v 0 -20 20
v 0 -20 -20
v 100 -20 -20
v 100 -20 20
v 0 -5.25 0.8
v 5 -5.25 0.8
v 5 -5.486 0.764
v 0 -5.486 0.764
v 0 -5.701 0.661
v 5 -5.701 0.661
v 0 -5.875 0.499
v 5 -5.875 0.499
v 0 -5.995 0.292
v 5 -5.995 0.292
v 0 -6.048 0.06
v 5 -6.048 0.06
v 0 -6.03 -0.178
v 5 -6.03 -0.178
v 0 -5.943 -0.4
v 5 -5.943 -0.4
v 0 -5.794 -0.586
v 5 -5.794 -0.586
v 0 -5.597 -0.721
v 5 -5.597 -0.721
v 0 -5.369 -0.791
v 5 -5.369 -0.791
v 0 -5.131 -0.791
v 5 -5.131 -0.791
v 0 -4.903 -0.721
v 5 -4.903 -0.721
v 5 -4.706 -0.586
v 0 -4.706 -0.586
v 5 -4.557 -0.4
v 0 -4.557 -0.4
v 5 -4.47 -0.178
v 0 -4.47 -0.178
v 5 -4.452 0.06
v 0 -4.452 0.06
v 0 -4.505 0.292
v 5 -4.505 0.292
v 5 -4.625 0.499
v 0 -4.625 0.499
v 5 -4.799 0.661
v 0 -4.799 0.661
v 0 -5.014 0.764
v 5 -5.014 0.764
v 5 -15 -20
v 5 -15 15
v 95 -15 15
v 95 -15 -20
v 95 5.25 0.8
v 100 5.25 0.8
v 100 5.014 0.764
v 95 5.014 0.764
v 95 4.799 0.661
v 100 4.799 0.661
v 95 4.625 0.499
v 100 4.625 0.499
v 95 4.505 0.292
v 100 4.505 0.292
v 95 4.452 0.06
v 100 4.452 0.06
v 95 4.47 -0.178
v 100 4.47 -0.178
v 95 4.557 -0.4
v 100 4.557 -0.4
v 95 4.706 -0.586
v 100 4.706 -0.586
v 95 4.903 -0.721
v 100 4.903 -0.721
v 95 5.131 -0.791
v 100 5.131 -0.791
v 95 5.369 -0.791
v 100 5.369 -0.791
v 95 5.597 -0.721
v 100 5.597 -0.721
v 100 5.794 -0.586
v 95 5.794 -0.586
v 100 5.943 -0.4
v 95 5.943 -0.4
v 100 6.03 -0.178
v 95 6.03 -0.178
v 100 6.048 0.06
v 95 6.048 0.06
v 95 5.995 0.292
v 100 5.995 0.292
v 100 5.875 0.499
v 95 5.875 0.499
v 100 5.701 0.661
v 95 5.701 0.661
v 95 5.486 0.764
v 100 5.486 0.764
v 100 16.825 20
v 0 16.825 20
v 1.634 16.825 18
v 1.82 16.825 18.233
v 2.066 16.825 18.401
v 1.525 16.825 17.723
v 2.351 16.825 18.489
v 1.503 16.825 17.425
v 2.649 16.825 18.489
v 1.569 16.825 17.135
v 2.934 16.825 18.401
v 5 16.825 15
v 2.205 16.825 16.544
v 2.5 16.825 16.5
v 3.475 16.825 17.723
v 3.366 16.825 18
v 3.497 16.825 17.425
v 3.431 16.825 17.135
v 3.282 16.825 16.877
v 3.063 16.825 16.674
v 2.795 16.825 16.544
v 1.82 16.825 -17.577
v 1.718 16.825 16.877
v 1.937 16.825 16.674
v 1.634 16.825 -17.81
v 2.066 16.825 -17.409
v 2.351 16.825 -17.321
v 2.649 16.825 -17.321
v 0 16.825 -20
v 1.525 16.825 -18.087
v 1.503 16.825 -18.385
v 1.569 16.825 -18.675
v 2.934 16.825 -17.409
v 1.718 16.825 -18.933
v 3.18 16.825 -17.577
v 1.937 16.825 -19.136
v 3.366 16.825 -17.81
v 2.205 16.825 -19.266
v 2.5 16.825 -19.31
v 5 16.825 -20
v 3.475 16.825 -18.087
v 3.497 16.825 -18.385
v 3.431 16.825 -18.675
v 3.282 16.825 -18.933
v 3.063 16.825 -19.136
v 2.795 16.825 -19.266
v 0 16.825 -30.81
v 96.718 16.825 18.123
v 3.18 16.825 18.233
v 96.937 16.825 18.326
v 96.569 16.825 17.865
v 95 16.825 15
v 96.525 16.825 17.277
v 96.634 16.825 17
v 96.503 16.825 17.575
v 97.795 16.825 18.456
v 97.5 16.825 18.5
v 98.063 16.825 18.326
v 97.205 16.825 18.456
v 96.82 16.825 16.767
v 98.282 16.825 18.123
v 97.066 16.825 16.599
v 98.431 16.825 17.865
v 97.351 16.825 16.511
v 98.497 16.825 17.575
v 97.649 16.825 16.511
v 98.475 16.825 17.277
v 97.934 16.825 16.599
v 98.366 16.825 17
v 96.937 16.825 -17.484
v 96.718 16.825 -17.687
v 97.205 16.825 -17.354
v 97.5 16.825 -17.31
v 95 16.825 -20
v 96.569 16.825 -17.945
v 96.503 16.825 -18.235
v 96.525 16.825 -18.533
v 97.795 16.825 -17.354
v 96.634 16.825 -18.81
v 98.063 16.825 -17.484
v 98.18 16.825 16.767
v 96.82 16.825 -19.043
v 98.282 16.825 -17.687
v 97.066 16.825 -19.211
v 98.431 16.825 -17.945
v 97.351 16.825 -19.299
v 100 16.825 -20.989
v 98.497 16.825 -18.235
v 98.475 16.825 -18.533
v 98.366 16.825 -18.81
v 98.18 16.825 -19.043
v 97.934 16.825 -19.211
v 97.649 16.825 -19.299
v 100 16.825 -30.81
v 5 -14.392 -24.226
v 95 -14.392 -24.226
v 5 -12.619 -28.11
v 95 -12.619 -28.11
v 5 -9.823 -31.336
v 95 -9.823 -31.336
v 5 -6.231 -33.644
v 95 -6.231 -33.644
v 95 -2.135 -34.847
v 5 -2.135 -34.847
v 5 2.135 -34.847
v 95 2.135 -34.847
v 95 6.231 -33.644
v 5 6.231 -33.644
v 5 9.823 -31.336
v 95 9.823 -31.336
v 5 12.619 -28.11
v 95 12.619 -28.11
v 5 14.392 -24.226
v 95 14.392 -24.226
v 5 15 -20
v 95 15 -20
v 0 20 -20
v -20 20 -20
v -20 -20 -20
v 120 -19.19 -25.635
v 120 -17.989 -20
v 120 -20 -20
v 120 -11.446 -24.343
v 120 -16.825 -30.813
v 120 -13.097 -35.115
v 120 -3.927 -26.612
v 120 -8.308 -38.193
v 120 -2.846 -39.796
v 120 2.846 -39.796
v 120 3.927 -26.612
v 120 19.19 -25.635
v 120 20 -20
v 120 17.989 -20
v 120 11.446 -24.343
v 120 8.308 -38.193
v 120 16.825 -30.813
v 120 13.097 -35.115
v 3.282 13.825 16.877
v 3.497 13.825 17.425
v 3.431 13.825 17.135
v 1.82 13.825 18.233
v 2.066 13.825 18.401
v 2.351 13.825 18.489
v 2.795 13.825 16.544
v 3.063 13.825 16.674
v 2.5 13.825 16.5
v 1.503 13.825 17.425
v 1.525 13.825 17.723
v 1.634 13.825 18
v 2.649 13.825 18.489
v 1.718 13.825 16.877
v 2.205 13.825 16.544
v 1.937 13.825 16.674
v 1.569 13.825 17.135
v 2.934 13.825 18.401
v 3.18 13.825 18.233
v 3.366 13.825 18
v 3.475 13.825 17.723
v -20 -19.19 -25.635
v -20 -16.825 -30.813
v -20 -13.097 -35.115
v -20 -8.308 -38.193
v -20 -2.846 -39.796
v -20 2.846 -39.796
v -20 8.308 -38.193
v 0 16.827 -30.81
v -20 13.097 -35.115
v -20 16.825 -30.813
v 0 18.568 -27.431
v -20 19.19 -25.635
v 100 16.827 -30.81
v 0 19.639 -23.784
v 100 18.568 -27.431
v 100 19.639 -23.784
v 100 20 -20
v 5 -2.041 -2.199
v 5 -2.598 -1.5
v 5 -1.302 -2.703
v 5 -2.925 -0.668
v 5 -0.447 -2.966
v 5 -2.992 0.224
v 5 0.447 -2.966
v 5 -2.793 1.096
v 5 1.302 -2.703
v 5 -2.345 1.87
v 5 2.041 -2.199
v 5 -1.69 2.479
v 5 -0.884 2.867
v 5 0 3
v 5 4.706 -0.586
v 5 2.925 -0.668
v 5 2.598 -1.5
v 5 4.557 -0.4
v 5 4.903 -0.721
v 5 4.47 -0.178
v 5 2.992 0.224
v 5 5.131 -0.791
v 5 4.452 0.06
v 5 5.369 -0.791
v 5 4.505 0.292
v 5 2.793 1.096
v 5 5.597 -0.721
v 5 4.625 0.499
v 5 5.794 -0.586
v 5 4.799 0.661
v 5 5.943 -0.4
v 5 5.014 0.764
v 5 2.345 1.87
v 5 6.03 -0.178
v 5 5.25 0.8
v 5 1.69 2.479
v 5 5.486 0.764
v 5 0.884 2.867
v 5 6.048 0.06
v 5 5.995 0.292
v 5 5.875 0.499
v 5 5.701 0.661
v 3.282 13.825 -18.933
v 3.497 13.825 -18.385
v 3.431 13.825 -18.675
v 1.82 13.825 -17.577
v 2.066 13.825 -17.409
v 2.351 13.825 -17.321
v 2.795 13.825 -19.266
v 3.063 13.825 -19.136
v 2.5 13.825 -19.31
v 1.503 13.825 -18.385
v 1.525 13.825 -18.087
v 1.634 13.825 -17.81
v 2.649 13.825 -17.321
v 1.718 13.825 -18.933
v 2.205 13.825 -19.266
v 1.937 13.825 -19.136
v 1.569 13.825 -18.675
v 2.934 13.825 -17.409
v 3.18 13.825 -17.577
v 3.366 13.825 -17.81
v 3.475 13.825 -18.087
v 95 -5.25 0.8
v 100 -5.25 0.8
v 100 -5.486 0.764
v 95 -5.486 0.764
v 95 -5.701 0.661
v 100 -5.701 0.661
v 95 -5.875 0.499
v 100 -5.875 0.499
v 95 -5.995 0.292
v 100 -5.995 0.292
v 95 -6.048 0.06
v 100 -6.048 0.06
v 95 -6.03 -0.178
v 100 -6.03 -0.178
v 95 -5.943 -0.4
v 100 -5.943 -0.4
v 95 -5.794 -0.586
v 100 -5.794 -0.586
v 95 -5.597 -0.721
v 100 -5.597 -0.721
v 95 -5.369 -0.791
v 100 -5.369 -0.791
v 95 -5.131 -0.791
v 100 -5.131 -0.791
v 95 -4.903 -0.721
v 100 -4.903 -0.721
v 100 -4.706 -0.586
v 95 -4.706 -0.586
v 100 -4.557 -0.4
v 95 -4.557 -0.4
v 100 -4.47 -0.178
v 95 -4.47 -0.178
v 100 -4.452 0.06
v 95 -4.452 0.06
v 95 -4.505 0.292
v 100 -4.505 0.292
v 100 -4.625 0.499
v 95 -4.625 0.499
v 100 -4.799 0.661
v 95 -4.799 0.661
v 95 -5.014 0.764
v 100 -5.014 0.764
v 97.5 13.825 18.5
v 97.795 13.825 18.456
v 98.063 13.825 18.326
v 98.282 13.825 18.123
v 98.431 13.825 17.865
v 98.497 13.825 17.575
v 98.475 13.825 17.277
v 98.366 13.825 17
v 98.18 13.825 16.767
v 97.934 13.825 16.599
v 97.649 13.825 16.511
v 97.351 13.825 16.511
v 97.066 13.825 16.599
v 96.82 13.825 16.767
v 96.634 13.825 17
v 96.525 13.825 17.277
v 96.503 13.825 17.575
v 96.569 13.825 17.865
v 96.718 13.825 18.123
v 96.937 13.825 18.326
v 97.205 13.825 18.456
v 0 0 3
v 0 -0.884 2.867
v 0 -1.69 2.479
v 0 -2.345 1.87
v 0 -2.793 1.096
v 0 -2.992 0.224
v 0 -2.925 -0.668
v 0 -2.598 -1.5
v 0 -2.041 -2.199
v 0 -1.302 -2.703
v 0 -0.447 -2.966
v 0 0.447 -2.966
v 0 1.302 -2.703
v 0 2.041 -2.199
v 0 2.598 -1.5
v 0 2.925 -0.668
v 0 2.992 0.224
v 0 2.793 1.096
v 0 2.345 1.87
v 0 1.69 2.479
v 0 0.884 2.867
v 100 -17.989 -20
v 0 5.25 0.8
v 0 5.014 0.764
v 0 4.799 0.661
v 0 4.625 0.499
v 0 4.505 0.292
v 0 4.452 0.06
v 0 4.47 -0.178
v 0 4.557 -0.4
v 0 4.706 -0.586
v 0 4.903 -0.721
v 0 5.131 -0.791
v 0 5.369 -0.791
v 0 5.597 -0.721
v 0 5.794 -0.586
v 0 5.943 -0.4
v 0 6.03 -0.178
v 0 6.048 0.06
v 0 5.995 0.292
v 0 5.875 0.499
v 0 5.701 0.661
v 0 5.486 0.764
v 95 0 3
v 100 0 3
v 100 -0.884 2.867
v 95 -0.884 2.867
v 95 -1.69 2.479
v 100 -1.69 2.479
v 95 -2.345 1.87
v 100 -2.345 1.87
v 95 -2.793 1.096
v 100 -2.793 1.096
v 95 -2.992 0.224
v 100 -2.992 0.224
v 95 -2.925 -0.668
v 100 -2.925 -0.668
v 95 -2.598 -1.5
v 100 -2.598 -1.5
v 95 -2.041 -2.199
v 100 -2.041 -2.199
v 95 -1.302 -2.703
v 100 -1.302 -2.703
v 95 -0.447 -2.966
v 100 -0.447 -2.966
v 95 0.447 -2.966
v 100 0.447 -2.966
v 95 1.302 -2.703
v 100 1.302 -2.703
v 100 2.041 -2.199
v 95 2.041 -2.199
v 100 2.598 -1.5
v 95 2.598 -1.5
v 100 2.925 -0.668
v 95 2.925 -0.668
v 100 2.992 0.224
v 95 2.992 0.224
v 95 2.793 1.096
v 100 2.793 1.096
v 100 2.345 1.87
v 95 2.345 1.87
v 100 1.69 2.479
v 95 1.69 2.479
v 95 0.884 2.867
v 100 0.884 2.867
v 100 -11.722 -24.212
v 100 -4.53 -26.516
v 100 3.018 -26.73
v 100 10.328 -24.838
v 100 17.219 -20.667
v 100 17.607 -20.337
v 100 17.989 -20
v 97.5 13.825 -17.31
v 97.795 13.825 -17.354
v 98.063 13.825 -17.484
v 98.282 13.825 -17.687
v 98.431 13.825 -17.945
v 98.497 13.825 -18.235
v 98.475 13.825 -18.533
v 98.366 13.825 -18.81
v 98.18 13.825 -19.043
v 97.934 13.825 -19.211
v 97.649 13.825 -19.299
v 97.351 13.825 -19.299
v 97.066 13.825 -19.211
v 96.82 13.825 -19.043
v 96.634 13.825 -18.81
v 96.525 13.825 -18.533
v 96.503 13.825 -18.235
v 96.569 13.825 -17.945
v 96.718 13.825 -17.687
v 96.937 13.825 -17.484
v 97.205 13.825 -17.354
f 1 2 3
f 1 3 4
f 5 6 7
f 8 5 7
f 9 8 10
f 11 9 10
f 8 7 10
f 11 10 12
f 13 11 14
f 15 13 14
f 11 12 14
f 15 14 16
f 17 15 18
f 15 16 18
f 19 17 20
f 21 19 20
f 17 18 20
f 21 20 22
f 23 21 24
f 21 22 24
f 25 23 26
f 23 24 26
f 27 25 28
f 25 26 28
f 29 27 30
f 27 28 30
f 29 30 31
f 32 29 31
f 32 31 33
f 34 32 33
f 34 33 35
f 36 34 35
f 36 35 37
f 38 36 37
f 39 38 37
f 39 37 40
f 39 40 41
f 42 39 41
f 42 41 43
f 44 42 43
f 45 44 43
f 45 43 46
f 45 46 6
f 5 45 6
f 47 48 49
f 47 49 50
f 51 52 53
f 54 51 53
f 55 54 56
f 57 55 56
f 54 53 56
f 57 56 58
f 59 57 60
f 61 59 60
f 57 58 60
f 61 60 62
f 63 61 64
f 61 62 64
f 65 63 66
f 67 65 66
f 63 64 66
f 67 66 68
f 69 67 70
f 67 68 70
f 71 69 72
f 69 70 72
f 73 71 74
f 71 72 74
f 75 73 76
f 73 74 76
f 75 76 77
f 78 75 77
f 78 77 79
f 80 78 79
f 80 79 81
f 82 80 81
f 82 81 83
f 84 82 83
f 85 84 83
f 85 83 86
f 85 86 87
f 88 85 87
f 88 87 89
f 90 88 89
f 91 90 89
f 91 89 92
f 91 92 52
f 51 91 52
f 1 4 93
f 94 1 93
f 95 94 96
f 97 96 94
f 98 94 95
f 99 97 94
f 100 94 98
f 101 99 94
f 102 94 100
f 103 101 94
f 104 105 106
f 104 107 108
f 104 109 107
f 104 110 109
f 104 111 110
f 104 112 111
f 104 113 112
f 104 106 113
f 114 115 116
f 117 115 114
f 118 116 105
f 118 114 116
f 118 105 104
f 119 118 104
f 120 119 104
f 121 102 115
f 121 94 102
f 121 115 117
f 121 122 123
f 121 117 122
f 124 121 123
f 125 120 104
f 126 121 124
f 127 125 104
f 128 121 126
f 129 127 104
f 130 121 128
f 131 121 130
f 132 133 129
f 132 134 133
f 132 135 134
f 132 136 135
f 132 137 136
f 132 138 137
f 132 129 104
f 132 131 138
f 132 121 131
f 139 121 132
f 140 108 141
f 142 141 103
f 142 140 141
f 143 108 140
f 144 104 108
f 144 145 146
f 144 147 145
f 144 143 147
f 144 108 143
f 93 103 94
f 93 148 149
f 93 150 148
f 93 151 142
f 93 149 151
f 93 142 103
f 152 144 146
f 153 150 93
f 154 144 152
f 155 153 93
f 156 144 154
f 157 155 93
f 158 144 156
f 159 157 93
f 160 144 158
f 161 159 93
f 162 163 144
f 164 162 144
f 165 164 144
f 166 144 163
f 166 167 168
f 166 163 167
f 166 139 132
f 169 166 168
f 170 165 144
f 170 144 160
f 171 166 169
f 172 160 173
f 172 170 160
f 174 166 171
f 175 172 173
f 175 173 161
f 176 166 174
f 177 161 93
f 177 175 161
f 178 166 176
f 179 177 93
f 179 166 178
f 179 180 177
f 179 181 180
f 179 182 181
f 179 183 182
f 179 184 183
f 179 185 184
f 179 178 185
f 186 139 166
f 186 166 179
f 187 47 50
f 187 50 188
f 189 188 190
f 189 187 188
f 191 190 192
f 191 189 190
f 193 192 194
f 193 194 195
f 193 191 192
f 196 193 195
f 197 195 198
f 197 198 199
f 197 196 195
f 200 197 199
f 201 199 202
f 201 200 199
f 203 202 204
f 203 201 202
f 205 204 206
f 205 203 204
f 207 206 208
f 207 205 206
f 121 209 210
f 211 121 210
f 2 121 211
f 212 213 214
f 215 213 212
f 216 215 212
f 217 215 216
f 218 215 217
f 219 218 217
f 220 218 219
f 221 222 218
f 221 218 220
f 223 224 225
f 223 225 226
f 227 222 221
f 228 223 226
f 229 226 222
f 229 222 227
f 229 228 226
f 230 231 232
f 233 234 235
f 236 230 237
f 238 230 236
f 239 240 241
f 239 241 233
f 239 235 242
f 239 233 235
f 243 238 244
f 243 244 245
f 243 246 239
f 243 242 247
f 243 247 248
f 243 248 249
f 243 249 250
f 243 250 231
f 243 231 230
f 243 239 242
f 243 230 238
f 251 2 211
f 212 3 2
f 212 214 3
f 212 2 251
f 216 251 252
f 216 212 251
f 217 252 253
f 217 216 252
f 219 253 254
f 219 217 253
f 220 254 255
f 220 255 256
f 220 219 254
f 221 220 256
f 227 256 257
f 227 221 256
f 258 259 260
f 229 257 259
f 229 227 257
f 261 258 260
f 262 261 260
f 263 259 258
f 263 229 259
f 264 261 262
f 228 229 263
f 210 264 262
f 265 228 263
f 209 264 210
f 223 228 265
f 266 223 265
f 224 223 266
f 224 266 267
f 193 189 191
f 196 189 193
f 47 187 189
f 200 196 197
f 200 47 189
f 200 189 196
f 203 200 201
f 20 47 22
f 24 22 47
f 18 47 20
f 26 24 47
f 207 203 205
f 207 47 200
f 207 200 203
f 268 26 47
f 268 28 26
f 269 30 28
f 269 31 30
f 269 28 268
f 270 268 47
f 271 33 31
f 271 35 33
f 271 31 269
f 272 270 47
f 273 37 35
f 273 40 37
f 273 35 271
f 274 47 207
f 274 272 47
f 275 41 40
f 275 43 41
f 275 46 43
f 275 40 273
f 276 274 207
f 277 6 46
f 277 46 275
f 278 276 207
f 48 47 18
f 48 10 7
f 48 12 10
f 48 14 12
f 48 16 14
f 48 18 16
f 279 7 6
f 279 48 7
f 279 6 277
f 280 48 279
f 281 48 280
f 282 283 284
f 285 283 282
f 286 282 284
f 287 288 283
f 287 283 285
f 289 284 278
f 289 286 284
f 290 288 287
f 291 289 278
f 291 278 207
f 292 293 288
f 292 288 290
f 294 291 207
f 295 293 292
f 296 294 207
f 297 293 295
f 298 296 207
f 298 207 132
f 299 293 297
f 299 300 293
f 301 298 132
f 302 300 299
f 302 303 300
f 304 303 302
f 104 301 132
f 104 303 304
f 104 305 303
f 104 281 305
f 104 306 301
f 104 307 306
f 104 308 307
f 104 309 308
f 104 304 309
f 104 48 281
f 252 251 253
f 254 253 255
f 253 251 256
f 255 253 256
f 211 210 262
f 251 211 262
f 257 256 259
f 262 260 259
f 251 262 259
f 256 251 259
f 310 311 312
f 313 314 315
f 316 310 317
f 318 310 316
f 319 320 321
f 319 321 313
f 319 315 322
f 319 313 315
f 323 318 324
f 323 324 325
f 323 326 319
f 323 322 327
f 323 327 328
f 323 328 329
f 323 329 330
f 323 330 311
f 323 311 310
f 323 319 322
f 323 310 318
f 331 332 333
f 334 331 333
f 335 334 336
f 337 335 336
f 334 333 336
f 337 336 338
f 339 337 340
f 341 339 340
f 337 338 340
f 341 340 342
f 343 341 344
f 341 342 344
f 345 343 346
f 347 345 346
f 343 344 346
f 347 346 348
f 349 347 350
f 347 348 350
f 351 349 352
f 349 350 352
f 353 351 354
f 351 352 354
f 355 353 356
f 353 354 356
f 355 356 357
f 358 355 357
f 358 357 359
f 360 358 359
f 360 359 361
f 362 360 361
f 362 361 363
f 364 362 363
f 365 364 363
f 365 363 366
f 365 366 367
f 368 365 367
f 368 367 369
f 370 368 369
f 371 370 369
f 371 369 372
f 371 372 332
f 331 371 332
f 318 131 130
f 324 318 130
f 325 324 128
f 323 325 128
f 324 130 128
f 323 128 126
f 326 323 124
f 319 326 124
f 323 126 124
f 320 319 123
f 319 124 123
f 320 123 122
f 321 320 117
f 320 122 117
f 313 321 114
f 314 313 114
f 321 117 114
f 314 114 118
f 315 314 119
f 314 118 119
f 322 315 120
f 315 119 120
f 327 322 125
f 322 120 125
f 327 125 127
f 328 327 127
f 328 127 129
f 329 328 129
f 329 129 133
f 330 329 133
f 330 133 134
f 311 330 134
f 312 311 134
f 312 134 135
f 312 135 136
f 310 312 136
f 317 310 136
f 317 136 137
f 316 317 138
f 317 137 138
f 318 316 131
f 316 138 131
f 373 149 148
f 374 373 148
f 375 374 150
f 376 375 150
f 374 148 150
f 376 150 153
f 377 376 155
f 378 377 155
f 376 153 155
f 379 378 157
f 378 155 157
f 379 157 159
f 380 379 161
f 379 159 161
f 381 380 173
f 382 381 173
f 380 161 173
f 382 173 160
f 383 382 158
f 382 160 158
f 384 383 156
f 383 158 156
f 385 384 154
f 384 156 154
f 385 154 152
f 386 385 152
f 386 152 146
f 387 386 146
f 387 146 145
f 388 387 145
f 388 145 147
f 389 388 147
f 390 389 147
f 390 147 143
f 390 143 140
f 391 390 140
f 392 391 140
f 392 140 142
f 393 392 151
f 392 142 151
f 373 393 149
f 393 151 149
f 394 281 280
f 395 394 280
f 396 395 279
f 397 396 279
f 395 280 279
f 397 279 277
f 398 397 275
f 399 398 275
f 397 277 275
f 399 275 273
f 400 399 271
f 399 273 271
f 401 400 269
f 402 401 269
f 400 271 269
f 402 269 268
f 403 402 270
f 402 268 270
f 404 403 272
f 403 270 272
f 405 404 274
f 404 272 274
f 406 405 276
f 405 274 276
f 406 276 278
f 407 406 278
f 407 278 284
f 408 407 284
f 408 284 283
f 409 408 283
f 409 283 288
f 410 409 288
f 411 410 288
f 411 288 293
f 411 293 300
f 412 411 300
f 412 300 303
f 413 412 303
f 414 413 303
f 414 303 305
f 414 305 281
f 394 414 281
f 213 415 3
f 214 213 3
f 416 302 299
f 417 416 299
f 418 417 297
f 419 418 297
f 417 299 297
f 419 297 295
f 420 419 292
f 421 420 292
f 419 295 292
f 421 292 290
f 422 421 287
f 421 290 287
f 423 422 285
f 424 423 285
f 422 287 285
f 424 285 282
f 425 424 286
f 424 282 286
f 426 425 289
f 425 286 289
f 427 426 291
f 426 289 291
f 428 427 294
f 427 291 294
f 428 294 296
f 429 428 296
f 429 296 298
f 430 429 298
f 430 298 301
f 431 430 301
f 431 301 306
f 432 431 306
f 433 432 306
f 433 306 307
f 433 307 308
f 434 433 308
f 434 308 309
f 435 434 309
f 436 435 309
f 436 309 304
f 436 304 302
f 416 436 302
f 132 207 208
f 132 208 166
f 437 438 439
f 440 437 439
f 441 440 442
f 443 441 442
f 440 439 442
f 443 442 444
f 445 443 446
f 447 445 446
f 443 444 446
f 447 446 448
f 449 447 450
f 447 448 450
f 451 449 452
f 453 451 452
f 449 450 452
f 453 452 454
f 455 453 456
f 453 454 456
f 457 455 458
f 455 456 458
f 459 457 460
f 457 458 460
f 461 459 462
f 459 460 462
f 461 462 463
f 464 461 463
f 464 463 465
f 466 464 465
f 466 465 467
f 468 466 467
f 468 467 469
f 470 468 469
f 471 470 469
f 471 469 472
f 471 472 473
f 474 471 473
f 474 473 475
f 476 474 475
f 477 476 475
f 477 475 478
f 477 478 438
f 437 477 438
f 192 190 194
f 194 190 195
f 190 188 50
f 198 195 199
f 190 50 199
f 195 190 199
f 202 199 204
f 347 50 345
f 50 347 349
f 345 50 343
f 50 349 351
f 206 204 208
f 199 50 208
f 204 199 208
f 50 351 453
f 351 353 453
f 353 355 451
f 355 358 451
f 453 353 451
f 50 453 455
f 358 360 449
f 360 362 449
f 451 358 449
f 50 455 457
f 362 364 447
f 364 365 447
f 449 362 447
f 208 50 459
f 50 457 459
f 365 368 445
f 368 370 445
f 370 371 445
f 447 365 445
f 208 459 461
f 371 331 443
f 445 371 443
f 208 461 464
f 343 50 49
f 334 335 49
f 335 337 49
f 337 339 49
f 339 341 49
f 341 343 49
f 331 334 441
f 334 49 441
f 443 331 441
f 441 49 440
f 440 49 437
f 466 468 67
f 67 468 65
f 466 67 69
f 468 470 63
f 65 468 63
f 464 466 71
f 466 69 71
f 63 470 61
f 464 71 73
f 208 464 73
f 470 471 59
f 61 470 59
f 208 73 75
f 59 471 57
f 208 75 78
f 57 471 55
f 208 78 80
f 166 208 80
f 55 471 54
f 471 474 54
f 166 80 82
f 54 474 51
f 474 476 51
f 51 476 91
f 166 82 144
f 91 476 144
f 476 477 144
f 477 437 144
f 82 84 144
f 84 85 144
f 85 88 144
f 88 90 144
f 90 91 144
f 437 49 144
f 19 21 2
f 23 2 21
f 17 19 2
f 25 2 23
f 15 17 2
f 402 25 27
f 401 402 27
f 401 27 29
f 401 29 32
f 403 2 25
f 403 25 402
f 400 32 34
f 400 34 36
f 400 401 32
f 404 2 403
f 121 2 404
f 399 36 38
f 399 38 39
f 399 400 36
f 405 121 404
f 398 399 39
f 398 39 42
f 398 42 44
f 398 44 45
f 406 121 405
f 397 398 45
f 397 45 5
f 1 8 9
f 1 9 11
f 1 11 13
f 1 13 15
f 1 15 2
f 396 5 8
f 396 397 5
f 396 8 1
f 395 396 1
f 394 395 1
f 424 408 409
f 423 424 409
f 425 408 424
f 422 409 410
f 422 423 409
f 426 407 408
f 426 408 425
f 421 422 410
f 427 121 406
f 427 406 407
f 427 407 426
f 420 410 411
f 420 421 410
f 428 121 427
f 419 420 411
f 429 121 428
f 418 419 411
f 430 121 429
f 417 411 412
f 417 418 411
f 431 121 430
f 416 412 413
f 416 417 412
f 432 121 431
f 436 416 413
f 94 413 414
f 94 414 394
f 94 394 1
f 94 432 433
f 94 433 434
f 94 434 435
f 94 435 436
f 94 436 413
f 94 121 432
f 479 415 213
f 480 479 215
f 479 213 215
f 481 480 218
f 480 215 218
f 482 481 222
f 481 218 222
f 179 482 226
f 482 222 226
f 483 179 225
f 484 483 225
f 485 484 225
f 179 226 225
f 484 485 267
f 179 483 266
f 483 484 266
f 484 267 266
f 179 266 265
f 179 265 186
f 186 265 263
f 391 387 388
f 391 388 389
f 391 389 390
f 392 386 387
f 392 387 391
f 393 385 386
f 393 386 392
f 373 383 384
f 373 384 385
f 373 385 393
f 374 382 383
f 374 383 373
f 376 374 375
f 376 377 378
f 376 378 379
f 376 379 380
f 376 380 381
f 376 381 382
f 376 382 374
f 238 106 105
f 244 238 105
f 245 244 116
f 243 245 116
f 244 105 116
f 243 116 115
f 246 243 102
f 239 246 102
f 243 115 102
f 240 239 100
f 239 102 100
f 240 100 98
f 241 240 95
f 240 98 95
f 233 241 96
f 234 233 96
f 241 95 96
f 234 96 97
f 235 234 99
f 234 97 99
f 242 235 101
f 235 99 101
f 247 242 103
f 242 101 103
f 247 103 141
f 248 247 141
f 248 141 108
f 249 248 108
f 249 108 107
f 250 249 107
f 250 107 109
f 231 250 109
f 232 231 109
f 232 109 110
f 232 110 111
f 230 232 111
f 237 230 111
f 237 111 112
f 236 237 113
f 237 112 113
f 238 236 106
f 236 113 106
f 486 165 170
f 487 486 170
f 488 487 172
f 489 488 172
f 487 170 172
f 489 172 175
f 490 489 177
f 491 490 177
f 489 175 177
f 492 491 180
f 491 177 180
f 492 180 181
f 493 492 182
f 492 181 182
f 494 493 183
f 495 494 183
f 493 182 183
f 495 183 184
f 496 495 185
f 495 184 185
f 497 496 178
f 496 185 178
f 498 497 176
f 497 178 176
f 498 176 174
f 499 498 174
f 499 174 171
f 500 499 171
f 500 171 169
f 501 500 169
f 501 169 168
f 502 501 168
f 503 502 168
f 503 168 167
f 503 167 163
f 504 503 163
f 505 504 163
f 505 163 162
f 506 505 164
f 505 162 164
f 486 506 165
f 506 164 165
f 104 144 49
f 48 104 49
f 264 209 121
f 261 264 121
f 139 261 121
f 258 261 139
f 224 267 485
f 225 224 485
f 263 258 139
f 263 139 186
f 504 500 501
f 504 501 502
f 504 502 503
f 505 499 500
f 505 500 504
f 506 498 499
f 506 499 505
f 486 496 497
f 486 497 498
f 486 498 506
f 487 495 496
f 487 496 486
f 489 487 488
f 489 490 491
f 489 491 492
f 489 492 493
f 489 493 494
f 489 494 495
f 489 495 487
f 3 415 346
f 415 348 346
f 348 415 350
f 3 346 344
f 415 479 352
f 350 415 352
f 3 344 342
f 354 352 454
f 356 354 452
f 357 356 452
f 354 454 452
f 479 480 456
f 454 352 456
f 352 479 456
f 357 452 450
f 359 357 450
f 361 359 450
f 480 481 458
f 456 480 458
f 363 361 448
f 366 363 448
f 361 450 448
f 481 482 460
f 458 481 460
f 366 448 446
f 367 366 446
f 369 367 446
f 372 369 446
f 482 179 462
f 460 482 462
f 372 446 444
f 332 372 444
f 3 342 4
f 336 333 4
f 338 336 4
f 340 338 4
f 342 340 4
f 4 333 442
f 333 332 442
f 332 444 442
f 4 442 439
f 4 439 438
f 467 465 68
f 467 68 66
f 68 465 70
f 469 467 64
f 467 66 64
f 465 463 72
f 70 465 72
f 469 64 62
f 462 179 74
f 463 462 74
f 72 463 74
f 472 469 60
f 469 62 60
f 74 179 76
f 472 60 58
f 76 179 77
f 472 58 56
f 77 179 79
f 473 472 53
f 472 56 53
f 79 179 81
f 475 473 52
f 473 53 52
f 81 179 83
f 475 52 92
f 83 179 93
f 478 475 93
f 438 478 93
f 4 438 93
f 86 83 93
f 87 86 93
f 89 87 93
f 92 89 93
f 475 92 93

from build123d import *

# Parameters (mm, degrees)
BOSS_EXTRUDE1_DEPTH = 100
SHELL3_START        = 5
SHELL3_DEPTH        = 90
BOSS_EXTRUDE2_DEPTH = 20
SKETCH7_W           = 100
SKETCH7_H           = 50.81
CUT_EXTRUDE6_DEPTH  = 3.175
CUT_EXTRUDE1_REACH  = 130.062
SKETCH2_R           = 0.8
SKETCH2_R_2         = 3
SKETCH8_R           = 1
CUT_EXTRUDE7_DEPTH  = 3
CUT_EXTRUDE8_DEPTH  = 20


# Read off the part's stored shape, not the designer's step: Shell3
with BuildPart() as part:
    # Sketch1 → Boss-Extrude1 (new body)
    with BuildSketch(Plane(origin=(0, 0, 0), x_dir=(0, 0, -1), z_dir=(1, 0, 0))):
        with BuildLine():
            Line((-20, 20), (20, 20))
            ThreePointArc((20, 20), (40, 0), (20, -20))
            Line((20, -20), (-20, -20))
            Line((-20, -20), (-20, 20))
        make_face()
    extrude(amount=BOSS_EXTRUDE1_DEPTH)

    # Shell3 outline → Shell3 (cut)
    with BuildSketch(Plane.YZ.offset(SHELL3_START)):
        with BuildLine():
            Line((15, -20), (20, -20))
            Line((20, -20), (20, 15))
            Line((20, 15), (-15, 15))
            Line((-15, 15), (-15, -20))
            ThreePointArc((-15, -20), (0, -35), (15, -20))
        make_face()
    extrude(amount=SHELL3_DEPTH, mode=Mode.SUBTRACT)

    # Sketch9 → Boss-Extrude2 (add)
    with BuildSketch(Plane(origin=(100, 0, 0), x_dir=(0, 0, -1), z_dir=(1, 0, 0))):
        with BuildLine():
            Line((20, 20), (20, -20))
            ThreePointArc((20, -20), (40, 0), (20, 20))
        make_face()
    boss_extrude2 = extrude(amount=BOSS_EXTRUDE2_DEPTH)

    # Mirror1: Boss-Extrude2 across plane
    add(boss_extrude2.mirror(Plane(origin=(50, 0, 0), x_dir=(0, 0, 1), z_dir=(1, 0, 0))))

    # Sketch7 → Cut-Extrude6 (cut)
    with BuildSketch(Plane(origin=(0, 20, 0), x_dir=(1, 0, 0), z_dir=(0, 1, 0))):
        with Locations((50, 5.405)):
            Rectangle(SKETCH7_W, SKETCH7_H)
    extrude(amount=-CUT_EXTRUDE6_DEPTH, mode=Mode.SUBTRACT)

    # Cut-Extrude1: up to this face of the body (flat: up to its plane)
    cut_extrude1_end = Plane(part.part.faces().sort_by_distance((0, -1.5875, 0))[0])
    # Sketch2 → Cut-Extrude1 (cut, up to the picked face)
    with BuildSketch(Plane(origin=(100, 0, 0), x_dir=(0, 0, -1), z_dir=(1, 0, 0)), mode=Mode.PRIVATE) as cut_extrude1_sk1:
        with Locations(Location((0, -5.25, 0), (0, 0, 180))):
            Circle(SKETCH2_R)
    cut_extrude1_tool1 = split(extrude(cut_extrude1_sk1.sketch, amount=-CUT_EXTRUDE1_REACH, mode=Mode.PRIVATE), bisect_by=cut_extrude1_end, keep=Keep.BOTH, mode=Mode.PRIVATE)
    # Sketch2 → Cut-Extrude1 (cut, up to the picked face)
    with BuildSketch(Plane(origin=(100, 0, 0), x_dir=(0, 0, -1), z_dir=(1, 0, 0)), mode=Mode.PRIVATE) as cut_extrude1_sk2:
        with Locations(Location((0, 0, 0), (0, 0, 180))):
            Circle(SKETCH2_R_2)
    cut_extrude1_tool2 = split(extrude(cut_extrude1_sk2.sketch, amount=-CUT_EXTRUDE1_REACH, mode=Mode.PRIVATE), bisect_by=cut_extrude1_end, keep=Keep.BOTH, mode=Mode.PRIVATE)
    # Sketch2 → Cut-Extrude1 (cut, up to the picked face)
    with BuildSketch(Plane(origin=(100, 0, 0), x_dir=(0, 0, -1), z_dir=(1, 0, 0)), mode=Mode.PRIVATE) as cut_extrude1_sk3:
        with Locations(Location((0, 5.25, 0), (0, 0, 180))):
            Circle(SKETCH2_R)
    cut_extrude1_tool3 = split(extrude(cut_extrude1_sk3.sketch, amount=-CUT_EXTRUDE1_REACH, mode=Mode.PRIVATE), bisect_by=cut_extrude1_end, keep=Keep.BOTH, mode=Mode.PRIVATE)
    add(cut_extrude1_tool1.solids().sort_by(Axis((100, -5.25, 0), (-1, 0, 0)))[0], mode=Mode.SUBTRACT)
    add(cut_extrude1_tool2.solids().sort_by(Axis((100, 0, 0), (-1, 0, 0)))[0], mode=Mode.SUBTRACT)
    add(cut_extrude1_tool3.solids().sort_by(Axis((100, 5.25, 0), (-1, 0, 0)))[0], mode=Mode.SUBTRACT)

    # Sketch8 → Cut-Extrude7 (cut)
    with BuildSketch(Plane(origin=(0, 16.825, 0), x_dir=(1, 0, 0), z_dir=(0, 1, 0))):
        with Locations(Location((97.5, -17.5, 0), (0, 0, 270))):
            Circle(SKETCH8_R)
        with Locations(Location((97.5, 18.31, 0), (0, 0, 270))):
            Circle(SKETCH8_R)
        with Locations(Location((2.5, -17.5, 0), (0, 0, 90))):
            Circle(SKETCH8_R)
        with Locations(Location((2.5, 18.31, 0), (0, 0, 90))):
            Circle(SKETCH8_R)
    extrude(amount=-CUT_EXTRUDE7_DEPTH, mode=Mode.SUBTRACT)

    # Sketch10 → Cut-Extrude8 (cut)
    with BuildSketch(Plane(origin=(120, 0, 0), x_dir=(0, 0, -1), z_dir=(1, 0, 0))):
        with BuildLine():
            Line((20, 17.989163405), (20, -17.989163405))
            ThreePointArc((20, -17.989163405), (26.9, 0), (20, 17.989163405))
        make_face()
    extrude(amount=-CUT_EXTRUDE8_DEPTH, mode=Mode.SUBTRACT)


solid = part.part
